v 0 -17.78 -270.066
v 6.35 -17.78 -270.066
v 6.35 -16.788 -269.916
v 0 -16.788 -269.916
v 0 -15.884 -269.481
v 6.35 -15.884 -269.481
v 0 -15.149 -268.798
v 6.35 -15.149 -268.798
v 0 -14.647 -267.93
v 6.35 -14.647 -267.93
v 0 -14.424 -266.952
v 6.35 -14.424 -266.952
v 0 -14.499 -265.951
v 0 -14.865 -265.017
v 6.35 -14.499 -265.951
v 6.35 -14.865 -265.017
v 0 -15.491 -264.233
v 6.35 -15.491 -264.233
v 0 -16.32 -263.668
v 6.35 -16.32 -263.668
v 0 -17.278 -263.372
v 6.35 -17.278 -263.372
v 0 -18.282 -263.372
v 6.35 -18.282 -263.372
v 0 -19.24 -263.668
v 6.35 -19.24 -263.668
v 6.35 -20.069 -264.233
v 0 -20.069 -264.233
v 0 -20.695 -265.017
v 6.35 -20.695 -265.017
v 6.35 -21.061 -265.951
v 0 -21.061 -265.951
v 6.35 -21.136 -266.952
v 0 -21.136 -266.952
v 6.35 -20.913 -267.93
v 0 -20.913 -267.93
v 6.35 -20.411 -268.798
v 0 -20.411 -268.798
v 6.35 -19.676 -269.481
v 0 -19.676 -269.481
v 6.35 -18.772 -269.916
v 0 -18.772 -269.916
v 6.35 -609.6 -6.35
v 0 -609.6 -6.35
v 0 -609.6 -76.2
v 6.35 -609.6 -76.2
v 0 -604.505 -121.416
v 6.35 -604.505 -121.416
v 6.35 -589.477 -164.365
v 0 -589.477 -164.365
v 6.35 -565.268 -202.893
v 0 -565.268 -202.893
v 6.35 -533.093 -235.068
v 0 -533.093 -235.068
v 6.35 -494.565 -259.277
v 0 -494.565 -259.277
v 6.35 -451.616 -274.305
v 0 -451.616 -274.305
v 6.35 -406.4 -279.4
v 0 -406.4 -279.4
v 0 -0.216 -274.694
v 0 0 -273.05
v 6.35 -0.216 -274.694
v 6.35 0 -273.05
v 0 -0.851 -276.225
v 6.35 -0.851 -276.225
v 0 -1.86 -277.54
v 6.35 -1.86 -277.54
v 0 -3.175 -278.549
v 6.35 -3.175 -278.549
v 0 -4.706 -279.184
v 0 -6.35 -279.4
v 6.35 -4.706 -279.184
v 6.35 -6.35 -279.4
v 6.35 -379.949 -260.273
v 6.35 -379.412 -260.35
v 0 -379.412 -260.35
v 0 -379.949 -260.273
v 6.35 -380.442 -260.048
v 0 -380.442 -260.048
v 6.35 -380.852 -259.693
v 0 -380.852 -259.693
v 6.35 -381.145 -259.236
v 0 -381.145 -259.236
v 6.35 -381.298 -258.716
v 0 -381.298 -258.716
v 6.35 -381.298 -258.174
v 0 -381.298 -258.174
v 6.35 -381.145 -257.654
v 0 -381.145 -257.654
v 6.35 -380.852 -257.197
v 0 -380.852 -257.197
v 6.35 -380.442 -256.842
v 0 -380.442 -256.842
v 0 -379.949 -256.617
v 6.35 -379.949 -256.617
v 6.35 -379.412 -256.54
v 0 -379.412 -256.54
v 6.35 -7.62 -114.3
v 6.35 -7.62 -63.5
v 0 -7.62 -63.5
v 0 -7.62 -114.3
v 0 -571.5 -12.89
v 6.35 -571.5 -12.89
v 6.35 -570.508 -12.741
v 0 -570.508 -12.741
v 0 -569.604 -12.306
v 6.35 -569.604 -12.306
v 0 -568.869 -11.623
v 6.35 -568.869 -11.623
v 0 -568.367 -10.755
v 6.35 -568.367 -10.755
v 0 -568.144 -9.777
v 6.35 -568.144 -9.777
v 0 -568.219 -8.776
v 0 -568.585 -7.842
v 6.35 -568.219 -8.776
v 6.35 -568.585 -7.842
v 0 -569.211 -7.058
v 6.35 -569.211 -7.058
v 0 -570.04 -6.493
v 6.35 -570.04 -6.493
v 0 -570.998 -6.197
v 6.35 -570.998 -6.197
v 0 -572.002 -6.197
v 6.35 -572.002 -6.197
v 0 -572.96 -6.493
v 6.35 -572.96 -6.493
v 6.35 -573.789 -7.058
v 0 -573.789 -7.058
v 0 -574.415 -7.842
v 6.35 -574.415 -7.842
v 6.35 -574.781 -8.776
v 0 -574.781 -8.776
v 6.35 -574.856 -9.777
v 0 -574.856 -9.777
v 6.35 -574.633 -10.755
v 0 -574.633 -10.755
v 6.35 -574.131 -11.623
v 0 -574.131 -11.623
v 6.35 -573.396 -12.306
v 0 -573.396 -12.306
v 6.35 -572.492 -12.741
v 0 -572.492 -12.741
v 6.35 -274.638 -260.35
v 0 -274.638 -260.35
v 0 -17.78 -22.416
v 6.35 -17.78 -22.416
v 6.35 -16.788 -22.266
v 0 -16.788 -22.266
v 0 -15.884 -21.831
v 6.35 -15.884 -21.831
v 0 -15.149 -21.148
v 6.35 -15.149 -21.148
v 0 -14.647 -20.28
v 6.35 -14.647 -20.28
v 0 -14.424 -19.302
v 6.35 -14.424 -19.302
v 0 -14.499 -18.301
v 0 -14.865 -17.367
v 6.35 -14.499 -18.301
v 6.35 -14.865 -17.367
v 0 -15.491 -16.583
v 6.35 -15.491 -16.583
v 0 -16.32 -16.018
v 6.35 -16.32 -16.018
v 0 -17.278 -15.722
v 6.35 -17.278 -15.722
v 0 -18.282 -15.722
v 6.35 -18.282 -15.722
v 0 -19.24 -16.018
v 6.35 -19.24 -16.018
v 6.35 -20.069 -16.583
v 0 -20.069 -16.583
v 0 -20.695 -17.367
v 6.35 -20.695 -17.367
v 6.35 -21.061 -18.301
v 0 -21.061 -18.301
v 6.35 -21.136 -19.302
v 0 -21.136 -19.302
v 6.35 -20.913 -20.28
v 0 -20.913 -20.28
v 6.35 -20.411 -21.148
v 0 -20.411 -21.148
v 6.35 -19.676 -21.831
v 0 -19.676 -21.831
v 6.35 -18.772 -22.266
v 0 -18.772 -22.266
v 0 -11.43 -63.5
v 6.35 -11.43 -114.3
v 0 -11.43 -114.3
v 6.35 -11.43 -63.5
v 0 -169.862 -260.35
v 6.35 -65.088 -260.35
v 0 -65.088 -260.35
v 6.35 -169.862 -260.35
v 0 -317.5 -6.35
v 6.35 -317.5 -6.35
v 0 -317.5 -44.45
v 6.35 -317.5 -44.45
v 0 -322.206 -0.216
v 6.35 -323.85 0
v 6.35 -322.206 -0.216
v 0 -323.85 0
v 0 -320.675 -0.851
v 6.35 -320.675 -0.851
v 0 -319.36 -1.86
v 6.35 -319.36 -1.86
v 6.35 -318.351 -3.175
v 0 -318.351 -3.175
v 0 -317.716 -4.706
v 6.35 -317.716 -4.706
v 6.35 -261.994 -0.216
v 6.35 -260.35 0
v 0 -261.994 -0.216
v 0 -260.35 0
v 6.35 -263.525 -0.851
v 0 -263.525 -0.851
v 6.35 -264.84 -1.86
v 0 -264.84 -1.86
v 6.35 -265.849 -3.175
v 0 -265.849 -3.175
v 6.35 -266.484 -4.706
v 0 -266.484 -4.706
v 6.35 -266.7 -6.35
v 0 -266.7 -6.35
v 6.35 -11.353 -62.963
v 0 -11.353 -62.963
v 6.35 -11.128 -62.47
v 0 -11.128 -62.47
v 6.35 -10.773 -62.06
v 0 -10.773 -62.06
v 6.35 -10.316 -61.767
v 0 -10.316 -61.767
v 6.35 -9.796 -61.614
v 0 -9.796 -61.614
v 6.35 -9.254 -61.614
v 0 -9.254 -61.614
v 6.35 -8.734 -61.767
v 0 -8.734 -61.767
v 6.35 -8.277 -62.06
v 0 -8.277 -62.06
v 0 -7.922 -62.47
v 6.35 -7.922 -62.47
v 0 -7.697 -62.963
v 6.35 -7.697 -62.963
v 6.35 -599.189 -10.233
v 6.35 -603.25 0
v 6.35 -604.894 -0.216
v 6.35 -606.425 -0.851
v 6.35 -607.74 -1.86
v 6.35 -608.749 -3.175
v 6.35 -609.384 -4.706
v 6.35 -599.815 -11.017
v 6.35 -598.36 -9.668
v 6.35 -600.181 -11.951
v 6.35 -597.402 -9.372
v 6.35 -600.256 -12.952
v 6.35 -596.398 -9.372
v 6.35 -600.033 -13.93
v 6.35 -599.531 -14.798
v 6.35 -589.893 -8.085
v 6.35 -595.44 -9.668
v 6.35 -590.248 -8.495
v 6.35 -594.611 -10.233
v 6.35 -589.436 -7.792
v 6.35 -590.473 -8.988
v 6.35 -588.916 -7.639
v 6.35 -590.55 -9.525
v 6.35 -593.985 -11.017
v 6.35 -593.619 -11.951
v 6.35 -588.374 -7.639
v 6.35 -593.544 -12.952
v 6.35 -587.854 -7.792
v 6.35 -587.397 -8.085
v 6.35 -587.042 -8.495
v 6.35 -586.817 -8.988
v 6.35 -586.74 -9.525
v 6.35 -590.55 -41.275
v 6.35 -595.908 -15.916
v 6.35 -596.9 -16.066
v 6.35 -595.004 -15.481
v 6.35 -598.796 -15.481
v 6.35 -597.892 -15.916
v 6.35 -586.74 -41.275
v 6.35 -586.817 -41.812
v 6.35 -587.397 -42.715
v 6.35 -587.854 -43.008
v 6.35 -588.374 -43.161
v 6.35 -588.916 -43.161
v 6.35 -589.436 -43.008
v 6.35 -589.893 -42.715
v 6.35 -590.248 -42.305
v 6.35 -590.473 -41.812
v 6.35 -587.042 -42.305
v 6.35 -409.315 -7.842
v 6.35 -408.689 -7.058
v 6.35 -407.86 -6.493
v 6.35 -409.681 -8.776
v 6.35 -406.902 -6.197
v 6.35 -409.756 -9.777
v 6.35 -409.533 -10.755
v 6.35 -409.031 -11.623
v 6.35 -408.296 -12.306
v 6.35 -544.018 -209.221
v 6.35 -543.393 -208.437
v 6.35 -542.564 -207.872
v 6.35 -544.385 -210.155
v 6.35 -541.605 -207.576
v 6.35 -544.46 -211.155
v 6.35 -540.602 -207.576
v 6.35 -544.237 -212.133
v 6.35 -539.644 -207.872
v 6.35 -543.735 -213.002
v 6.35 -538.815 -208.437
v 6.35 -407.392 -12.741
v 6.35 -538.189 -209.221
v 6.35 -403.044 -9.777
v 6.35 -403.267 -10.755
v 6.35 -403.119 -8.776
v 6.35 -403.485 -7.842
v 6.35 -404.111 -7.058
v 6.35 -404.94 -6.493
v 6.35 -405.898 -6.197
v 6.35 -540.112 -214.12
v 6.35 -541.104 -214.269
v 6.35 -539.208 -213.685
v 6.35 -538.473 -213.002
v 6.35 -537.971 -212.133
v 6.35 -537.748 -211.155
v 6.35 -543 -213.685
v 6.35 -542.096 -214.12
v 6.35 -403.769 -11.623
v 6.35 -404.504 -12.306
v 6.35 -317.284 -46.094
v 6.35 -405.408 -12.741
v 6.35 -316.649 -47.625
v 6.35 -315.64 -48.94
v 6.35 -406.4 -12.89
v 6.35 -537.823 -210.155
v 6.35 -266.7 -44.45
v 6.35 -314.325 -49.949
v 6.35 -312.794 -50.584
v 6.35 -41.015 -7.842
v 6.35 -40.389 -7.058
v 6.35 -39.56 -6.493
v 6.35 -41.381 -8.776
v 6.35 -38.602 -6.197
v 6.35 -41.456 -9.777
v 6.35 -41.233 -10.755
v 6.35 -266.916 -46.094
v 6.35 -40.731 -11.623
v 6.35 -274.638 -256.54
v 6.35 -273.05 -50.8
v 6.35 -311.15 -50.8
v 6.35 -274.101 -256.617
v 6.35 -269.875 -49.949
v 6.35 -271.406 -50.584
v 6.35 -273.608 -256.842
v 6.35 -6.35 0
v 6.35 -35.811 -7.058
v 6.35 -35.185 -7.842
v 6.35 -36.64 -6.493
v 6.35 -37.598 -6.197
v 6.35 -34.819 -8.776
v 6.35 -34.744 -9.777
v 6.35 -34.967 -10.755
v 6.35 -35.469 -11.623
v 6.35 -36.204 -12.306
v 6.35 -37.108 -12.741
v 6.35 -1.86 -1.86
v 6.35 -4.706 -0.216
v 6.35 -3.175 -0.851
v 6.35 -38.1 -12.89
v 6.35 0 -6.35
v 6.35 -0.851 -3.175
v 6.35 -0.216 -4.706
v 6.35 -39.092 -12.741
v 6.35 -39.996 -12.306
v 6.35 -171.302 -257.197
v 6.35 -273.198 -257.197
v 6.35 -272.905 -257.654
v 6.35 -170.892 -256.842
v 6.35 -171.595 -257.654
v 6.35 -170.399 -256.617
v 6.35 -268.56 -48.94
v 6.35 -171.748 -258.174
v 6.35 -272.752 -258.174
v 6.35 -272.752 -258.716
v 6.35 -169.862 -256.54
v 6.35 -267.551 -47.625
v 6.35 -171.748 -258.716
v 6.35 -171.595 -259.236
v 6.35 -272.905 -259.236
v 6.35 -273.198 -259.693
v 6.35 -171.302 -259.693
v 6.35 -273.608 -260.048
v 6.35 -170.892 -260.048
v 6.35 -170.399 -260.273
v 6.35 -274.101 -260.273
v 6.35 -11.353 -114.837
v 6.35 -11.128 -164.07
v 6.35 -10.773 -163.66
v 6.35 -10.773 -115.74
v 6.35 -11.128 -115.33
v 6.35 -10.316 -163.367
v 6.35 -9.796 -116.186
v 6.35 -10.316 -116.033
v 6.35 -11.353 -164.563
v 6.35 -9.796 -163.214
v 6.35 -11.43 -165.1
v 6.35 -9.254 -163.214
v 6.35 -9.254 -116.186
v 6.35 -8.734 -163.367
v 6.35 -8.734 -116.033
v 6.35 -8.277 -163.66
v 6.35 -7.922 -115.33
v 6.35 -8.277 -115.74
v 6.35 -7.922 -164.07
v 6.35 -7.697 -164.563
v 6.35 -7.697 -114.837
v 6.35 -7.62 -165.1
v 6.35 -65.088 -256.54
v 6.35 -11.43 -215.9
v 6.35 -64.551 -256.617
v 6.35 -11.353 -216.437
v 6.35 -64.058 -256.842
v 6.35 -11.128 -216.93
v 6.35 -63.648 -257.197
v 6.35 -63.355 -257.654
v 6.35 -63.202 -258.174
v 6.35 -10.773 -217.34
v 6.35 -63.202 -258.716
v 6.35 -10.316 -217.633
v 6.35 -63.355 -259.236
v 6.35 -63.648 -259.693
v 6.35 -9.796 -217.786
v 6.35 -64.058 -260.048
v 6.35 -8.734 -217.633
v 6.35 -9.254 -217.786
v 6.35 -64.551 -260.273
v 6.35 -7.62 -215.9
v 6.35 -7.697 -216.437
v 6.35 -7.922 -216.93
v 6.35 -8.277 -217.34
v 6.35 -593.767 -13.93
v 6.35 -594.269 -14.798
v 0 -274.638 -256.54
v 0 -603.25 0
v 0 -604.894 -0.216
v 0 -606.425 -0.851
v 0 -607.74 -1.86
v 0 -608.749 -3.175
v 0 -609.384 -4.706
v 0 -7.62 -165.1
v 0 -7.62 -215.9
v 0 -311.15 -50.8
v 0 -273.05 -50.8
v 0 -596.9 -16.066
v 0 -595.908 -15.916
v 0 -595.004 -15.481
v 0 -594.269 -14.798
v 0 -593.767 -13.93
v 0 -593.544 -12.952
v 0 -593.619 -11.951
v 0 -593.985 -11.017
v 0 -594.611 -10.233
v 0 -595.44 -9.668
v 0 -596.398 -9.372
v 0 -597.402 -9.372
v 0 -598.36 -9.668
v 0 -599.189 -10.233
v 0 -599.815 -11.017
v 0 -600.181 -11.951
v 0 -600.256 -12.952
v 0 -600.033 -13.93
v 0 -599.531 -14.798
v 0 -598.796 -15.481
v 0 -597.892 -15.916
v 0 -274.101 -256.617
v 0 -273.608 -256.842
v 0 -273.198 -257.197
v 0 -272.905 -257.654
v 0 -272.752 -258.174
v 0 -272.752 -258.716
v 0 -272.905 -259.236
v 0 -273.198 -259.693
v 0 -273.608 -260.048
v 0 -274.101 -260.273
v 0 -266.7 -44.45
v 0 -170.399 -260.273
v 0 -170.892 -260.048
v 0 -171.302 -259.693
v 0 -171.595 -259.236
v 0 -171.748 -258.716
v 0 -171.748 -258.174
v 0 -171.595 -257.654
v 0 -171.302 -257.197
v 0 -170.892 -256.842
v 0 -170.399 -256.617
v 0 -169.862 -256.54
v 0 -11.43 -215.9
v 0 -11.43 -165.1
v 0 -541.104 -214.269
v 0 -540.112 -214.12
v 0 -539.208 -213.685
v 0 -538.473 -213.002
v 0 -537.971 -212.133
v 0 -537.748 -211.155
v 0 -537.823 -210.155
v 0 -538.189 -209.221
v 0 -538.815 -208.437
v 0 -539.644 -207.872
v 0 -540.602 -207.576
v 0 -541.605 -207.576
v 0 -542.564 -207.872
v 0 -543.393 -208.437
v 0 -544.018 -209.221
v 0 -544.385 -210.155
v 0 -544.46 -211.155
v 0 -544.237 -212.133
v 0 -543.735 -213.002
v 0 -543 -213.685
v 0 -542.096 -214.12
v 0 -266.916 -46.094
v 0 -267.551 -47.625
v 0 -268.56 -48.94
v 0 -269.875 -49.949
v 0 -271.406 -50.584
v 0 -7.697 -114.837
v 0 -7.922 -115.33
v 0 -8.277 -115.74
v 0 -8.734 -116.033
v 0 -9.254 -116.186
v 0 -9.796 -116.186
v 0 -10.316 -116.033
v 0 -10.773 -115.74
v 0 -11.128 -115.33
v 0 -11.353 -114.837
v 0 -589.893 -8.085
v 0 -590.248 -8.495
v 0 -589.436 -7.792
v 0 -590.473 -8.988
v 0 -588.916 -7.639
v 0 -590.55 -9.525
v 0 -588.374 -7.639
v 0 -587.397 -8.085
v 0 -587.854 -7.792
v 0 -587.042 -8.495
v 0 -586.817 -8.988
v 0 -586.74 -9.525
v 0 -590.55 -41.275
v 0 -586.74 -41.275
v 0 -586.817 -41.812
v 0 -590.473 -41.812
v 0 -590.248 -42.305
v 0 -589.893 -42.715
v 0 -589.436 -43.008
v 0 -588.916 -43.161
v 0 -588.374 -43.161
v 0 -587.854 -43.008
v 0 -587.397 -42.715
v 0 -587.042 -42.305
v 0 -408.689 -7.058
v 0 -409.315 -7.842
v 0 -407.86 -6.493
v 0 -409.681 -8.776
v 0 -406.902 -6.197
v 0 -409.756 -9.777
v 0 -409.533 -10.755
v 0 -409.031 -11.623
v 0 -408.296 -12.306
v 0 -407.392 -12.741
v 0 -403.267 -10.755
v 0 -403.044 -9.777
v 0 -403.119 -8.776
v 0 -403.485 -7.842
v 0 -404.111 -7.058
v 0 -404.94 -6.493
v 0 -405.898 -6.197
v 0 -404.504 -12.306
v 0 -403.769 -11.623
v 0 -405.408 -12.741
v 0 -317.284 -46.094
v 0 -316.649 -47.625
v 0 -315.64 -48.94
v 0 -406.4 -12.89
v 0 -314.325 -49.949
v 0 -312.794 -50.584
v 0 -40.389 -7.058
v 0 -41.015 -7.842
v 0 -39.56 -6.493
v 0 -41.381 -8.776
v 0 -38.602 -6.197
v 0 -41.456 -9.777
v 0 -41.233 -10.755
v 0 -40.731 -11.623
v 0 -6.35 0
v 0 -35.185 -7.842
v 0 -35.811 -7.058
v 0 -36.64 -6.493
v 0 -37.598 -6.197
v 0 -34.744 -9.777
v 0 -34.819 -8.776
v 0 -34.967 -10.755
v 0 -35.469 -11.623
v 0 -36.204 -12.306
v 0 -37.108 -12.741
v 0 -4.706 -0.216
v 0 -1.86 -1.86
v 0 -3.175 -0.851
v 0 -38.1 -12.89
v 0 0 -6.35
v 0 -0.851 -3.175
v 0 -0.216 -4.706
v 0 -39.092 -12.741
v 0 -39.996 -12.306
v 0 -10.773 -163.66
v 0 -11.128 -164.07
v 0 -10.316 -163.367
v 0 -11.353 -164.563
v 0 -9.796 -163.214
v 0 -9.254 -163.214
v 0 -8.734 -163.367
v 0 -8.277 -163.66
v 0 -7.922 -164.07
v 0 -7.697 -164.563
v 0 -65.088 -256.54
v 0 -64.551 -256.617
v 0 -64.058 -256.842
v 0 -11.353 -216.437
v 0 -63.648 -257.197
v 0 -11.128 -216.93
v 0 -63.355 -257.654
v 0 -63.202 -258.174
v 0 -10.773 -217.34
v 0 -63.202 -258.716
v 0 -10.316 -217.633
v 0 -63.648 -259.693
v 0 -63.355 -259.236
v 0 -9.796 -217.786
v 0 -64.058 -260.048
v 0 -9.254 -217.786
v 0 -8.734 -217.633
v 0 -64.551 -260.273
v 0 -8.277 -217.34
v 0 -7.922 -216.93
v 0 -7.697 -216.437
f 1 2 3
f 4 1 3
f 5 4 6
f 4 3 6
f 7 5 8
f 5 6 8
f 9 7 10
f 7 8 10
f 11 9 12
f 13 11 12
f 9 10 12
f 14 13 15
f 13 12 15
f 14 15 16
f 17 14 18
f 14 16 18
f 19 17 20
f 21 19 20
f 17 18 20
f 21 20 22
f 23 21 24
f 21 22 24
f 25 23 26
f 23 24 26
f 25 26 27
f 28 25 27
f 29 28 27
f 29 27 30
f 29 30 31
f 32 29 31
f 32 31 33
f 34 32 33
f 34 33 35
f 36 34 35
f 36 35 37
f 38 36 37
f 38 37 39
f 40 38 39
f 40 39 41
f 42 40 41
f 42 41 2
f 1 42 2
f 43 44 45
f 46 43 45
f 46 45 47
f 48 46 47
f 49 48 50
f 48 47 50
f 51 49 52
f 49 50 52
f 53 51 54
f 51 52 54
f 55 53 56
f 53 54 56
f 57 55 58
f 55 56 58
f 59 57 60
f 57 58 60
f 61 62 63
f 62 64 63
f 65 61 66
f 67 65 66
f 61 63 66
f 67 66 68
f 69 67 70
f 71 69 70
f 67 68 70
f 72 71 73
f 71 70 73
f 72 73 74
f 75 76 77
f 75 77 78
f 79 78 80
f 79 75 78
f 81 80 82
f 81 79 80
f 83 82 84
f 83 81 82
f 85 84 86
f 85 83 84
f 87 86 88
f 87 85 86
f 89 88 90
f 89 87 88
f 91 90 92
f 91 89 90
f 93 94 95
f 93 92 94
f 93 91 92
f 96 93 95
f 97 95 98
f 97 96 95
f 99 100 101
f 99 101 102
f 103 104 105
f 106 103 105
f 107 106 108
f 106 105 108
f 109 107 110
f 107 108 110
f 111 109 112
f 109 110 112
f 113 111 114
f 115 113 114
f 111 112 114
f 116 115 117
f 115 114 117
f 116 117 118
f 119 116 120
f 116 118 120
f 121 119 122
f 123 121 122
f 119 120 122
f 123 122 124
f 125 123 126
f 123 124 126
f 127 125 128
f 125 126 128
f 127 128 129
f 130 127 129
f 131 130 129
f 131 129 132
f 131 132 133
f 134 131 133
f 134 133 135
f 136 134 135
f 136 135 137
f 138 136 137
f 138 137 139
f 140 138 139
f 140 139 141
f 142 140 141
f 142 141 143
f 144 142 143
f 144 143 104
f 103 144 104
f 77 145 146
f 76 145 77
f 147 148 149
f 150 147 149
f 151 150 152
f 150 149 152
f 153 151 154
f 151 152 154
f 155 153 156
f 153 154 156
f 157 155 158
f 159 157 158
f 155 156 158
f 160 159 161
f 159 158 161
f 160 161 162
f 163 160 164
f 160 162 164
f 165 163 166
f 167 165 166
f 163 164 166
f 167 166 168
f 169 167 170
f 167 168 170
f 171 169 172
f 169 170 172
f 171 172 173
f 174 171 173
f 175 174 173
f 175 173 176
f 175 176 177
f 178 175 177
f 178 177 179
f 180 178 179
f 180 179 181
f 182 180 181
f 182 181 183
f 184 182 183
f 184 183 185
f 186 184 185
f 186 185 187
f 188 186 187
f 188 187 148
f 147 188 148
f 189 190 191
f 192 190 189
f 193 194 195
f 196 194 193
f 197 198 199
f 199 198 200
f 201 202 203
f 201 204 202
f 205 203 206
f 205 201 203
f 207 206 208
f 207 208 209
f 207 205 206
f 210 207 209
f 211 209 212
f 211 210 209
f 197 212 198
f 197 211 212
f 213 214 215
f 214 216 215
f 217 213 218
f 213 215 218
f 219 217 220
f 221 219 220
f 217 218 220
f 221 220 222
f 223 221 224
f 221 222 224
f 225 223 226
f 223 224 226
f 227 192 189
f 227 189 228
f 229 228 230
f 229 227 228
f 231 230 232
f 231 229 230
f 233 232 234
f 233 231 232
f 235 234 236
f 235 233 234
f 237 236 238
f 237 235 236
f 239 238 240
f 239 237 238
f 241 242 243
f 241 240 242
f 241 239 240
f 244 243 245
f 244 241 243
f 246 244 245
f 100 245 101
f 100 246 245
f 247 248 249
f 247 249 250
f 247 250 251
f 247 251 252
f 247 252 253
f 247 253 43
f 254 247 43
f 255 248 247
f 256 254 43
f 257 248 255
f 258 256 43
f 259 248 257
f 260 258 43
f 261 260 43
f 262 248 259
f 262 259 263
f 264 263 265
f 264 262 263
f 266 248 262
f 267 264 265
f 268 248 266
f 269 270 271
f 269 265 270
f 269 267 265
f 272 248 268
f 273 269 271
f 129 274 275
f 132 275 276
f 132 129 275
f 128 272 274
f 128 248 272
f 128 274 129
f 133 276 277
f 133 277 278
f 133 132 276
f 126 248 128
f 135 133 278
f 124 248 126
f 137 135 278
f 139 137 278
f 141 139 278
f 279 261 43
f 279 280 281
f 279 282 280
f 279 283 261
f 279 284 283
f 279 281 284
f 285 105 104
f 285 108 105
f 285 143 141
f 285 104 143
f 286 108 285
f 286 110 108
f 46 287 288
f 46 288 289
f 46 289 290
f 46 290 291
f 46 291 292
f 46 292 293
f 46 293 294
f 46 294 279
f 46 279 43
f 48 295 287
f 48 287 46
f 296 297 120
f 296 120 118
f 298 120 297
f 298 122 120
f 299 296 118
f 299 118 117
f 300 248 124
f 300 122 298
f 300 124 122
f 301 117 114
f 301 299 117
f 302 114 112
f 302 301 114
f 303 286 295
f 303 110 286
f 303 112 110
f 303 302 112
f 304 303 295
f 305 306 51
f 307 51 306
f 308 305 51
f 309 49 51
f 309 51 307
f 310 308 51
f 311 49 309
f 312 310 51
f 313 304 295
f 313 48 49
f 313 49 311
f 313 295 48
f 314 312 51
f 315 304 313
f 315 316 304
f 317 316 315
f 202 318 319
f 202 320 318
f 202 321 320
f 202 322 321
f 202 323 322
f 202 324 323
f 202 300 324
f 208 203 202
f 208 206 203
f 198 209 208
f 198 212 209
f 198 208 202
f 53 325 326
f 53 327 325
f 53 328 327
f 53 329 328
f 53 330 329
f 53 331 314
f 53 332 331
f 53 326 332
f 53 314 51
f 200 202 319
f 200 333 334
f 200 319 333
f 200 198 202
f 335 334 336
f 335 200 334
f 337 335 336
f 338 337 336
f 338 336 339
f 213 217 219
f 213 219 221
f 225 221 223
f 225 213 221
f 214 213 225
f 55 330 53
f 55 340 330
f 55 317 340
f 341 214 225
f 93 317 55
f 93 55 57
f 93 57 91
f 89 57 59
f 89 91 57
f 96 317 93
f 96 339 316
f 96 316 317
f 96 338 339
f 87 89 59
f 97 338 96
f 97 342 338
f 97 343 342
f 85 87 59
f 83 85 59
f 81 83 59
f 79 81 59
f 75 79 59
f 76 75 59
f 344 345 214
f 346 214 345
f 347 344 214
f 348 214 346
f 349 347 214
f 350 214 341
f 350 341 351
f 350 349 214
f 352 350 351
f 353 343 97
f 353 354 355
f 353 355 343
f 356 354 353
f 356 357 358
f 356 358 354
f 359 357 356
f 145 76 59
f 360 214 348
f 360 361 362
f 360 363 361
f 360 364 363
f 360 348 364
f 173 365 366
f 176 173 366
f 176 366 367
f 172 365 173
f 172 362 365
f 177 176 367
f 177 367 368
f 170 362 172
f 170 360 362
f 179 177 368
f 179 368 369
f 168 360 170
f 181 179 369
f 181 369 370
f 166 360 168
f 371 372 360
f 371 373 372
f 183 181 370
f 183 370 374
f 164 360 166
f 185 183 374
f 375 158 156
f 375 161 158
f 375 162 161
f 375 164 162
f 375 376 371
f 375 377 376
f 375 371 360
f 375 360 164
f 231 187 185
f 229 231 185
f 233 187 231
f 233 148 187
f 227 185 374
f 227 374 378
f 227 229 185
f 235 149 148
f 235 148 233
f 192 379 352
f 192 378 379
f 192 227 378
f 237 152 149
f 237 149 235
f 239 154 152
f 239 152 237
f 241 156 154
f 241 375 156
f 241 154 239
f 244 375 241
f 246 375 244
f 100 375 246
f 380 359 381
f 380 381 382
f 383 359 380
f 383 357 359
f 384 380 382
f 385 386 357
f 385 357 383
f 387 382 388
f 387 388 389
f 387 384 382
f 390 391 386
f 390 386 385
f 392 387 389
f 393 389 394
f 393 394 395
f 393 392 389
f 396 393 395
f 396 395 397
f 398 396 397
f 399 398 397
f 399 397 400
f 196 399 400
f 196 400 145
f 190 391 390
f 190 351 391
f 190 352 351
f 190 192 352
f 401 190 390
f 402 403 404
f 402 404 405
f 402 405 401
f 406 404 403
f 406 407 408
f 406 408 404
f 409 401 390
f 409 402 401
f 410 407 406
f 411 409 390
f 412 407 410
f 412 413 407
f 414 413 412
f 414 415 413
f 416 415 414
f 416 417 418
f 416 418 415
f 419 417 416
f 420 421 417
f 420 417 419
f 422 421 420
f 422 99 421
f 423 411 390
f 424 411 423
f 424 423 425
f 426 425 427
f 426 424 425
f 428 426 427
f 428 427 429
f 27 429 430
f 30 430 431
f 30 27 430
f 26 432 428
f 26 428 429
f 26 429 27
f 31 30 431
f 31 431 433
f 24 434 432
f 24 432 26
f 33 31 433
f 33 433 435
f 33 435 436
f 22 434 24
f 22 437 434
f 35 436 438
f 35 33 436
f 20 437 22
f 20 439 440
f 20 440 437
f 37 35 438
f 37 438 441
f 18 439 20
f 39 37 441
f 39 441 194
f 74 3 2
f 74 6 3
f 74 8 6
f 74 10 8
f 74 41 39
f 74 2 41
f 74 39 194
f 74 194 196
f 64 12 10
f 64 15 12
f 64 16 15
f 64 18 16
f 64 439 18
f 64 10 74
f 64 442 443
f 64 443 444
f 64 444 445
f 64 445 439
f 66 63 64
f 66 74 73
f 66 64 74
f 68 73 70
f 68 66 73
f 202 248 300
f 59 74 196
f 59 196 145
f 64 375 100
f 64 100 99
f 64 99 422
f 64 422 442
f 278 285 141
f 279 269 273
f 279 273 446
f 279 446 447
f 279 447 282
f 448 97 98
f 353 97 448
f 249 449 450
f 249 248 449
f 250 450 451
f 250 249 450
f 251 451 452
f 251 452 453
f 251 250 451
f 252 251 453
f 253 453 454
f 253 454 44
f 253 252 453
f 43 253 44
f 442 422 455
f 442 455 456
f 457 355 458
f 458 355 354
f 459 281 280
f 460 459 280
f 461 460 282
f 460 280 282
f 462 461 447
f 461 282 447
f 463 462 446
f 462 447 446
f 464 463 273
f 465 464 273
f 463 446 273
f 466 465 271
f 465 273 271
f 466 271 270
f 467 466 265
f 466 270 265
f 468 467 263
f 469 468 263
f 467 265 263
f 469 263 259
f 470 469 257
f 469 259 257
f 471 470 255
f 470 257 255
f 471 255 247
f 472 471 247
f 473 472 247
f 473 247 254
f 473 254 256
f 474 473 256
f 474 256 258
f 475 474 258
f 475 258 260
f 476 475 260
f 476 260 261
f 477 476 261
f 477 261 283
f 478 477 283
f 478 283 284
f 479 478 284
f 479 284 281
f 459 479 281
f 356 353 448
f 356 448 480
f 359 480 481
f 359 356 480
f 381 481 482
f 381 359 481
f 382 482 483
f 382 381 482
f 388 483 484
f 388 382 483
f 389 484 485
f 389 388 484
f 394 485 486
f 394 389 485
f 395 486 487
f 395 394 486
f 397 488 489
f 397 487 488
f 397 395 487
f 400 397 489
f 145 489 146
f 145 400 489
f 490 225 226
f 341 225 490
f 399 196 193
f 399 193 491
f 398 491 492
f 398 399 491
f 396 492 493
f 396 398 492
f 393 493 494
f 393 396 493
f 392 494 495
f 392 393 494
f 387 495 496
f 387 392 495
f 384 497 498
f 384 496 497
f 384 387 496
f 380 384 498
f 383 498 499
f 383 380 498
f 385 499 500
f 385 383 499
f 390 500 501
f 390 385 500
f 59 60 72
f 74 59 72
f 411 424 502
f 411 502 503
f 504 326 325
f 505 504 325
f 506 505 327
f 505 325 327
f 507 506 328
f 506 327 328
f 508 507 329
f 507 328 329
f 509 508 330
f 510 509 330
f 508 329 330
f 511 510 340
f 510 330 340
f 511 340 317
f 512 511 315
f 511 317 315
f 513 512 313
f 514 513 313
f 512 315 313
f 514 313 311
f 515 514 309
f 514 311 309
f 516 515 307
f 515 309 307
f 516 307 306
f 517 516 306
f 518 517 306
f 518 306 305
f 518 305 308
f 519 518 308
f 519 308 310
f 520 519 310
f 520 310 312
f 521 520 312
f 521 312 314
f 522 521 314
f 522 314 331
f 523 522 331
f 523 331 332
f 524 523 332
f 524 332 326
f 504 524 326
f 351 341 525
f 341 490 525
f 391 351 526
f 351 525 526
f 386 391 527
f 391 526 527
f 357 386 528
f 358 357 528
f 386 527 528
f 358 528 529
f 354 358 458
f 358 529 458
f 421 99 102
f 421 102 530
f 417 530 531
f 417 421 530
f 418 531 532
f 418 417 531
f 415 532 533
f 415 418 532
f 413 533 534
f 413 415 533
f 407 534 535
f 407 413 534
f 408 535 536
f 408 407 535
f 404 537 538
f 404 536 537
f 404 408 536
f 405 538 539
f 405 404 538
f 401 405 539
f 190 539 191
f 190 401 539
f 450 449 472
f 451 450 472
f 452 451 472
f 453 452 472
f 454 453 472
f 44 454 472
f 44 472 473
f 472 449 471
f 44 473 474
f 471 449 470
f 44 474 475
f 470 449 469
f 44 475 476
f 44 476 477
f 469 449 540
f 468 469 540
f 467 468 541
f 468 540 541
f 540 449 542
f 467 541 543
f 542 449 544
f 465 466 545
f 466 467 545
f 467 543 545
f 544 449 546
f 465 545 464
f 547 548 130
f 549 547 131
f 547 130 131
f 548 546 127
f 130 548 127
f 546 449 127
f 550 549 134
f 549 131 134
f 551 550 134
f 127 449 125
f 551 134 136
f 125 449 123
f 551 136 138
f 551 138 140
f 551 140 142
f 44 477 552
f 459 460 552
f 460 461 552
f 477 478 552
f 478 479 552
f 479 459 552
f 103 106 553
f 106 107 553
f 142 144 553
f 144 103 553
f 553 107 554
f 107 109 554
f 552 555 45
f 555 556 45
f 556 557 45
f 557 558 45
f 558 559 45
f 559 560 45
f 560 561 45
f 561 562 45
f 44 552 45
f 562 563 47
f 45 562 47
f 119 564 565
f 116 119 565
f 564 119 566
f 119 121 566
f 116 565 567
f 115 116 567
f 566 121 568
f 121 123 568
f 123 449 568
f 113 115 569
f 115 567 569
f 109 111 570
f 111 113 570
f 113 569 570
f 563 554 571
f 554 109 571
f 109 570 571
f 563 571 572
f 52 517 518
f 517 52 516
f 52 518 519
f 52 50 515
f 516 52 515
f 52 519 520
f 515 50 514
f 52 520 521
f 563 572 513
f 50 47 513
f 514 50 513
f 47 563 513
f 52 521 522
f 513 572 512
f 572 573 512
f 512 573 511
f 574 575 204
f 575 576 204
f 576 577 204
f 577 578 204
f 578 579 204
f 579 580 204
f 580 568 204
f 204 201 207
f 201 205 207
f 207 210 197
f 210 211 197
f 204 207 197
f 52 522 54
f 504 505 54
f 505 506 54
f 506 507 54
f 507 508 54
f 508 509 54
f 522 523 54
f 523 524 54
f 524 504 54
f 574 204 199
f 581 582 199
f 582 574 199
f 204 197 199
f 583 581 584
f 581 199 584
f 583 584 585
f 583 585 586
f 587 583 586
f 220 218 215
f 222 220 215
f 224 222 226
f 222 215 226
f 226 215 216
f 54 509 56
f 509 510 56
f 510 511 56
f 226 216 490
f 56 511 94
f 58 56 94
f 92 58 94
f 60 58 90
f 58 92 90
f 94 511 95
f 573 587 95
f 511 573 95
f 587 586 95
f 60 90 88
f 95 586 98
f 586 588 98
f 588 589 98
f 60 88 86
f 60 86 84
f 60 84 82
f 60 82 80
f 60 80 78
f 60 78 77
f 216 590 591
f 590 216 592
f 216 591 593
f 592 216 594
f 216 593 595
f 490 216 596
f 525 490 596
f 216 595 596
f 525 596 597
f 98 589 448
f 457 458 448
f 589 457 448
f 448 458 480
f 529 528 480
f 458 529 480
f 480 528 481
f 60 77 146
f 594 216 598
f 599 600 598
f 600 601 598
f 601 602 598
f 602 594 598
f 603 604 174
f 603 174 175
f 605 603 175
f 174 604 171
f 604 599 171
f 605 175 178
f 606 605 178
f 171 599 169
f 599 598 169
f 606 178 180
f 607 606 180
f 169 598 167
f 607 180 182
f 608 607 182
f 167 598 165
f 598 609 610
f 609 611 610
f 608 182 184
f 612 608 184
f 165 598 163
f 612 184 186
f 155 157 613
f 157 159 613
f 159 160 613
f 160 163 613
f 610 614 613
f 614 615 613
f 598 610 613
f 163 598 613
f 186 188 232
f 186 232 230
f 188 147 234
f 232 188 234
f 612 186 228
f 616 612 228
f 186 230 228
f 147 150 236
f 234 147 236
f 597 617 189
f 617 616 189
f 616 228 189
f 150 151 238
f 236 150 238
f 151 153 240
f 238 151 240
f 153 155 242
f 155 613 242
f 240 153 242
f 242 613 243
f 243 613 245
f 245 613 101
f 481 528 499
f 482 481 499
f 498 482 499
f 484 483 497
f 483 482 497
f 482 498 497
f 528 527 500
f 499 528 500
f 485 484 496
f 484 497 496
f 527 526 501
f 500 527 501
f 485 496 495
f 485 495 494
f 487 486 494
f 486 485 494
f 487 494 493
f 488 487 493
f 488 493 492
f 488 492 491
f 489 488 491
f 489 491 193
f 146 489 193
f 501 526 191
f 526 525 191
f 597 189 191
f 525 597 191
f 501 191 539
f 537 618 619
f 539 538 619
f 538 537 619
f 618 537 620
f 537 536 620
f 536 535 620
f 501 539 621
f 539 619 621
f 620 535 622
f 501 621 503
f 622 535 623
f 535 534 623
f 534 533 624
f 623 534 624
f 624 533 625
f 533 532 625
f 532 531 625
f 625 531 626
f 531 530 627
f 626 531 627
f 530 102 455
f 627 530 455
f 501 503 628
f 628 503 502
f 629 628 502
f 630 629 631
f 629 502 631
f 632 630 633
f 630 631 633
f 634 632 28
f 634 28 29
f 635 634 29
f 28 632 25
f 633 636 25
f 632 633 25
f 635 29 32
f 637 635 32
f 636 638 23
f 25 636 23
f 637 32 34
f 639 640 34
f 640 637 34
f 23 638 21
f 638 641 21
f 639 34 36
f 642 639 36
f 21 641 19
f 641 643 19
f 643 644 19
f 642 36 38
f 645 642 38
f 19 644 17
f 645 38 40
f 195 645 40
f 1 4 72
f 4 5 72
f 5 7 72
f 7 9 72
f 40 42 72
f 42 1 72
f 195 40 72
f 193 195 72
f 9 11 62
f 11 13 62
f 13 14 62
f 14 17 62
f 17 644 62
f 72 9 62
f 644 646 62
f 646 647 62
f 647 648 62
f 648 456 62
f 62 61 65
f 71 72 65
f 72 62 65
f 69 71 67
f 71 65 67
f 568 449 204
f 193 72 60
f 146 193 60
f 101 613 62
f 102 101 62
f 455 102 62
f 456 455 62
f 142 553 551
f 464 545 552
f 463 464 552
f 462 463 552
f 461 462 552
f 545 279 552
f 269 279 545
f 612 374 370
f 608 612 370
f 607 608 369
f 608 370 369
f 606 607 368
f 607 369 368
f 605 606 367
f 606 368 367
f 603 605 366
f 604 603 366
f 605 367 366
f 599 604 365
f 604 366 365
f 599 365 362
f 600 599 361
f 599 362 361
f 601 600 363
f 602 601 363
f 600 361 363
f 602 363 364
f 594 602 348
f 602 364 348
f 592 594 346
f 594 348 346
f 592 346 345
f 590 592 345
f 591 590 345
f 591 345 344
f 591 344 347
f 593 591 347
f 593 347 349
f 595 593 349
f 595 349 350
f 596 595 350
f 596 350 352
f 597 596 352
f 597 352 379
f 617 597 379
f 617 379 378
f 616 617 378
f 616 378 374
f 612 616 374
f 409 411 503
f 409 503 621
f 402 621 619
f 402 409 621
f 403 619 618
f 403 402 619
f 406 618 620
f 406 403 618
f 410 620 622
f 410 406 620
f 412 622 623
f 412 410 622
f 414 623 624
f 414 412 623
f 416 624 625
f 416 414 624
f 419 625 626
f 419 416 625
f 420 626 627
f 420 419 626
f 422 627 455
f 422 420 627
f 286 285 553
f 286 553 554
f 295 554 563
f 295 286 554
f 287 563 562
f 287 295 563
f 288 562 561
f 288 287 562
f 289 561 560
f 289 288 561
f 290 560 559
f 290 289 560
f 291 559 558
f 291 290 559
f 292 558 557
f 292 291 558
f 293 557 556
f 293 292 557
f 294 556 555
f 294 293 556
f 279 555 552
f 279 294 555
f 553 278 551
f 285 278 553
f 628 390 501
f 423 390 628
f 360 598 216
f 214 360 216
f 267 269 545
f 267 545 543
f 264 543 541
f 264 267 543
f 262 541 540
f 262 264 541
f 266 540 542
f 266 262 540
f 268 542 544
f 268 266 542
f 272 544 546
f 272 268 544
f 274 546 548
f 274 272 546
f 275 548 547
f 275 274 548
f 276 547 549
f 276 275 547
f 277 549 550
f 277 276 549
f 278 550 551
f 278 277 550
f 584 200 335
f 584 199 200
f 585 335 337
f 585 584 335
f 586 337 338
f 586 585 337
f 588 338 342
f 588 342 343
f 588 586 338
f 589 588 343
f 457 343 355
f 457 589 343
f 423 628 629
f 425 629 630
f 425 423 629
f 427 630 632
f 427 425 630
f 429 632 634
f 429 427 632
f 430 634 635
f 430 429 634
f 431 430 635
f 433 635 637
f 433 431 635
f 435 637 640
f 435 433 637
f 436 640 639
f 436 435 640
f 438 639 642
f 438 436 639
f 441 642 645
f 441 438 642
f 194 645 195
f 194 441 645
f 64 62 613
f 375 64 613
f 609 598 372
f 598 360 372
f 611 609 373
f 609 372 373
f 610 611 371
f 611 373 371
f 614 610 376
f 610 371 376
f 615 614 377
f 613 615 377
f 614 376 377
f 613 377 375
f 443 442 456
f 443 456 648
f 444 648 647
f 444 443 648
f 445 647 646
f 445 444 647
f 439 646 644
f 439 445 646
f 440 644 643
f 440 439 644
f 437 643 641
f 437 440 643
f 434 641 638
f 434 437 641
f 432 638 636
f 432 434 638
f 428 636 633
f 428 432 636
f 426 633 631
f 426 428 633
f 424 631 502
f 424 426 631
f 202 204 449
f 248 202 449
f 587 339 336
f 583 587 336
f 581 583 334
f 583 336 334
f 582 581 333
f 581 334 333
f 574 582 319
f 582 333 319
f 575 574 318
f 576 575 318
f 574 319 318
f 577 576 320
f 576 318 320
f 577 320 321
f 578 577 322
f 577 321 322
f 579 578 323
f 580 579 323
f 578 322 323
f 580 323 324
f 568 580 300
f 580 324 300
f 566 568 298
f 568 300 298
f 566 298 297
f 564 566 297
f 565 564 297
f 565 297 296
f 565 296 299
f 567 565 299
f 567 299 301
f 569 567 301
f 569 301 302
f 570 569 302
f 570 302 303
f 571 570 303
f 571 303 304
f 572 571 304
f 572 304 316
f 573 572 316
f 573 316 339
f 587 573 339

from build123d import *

# Parameters (mm, degrees)
BOSS_EXTRUDE1_DEPTH     = 6.35
SKETCH2_R               = 3.3655
CUT_EXTRUDE1_DEPTH      = 7.35
FILLET1_R               = 6.35
CUT_EXTRUDE6_DEPTH      = 7.35
SKETCH4_R               = 3.3655
CUT_EXTRUDE3_DEPTH      = 7.35
CUT_EXTRUDE7_DEPTH      = 7.35
CUT_EXTRUDE8_DEPTH      = 1
CUT_EXTRUDE8_DEPTH_BACK = 7.35
SKETCH8_W               = 50.8
SKETCH8_H               = 50.8
CUT_EXTRUDE9_DEPTH      = 7.35
FILLET2_R               = 6.35


with BuildPart() as part:
    # Sketch1 → Boss-Extrude1 (new body)
    with BuildSketch(Plane(origin=(0, 0, 0), x_dir=(0, 0, -1), z_dir=(1, 0, 0))):
        with BuildLine():
            Line((0, 0), (0, -609.6))
            Line((0, -609.6), (76.2, -609.6))
            ThreePointArc((76.2, -609.6), (219.884097937, -550.084097937), (279.4, -406.4))
            Line((279.4, -406.4), (279.4, 0))
            Line((279.4, 0), (0, 0))
        make_face()
    extrude(amount=BOSS_EXTRUDE1_DEPTH)

    # Sketch2 → Cut-Extrude1 (cut, through all)
    with BuildSketch(Plane(origin=(6.35, 0, 0), x_dir=(0, 0, -1), z_dir=(1, 0, 0))):
        with Locations((266.7, -17.78)):
            Circle(SKETCH2_R)
        with Locations((12.7, -596.9)):
            Circle(SKETCH2_R)
        with Locations((210.903841816, -541.103841816)):
            Circle(SKETCH2_R)
        with Locations((19.05, -17.78)):
            Circle(SKETCH2_R)
    extrude(amount=-CUT_EXTRUDE1_DEPTH, mode=Mode.SUBTRACT)

    # Fillet1
    fillet1_edges = [part.edges().sort_by_distance(p)[0] for p in [
        (3.175, 0, -279.4),
        (3.175, -609.6, 0),
        (3.175, 0, 0),
    ]]
    fillet(fillet1_edges, radius=FILLET1_R)

    # Sketch3 → Cut-Extrude6 (cut, through all)
    with BuildSketch(Plane(origin=(6.35, 0, 0), x_dir=(0, 0, -1), z_dir=(1, 0, 0))):
        with BuildLine():
            Line((63.5, -7.62), (114.3, -7.62))
            ThreePointArc((114.3, -7.62), (116.205, -9.525), (114.3, -11.43))
            Line((114.3, -11.43), (63.5, -11.43))
            ThreePointArc((63.5, -11.43), (61.595, -9.525), (63.5, -7.62))
        make_face()
        with BuildLine():
            Line((165.1, -7.62), (215.9, -7.62))
            ThreePointArc((215.9, -7.62), (217.805, -9.525), (215.9, -11.43))
            Line((215.9, -11.43), (165.1, -11.43))
            ThreePointArc((165.1, -11.43), (163.195, -9.525), (165.1, -7.62))
        make_face()
    extrude(amount=-CUT_EXTRUDE6_DEPTH, mode=Mode.SUBTRACT)

    # Sketch4 → Cut-Extrude3 (cut, through all)
    with BuildSketch(Plane(origin=(6.35, 0, 0), x_dir=(0, 0, -1), z_dir=(1, 0, 0))):
        with Locations((9.525, -38.1)):
            Circle(SKETCH4_R)
        with Locations((9.525, -406.4)):
            Circle(SKETCH4_R)
        with Locations((9.525, -571.5)):
            Circle(SKETCH4_R)
    extrude(amount=-CUT_EXTRUDE3_DEPTH, mode=Mode.SUBTRACT)

    # Sketch6 → Cut-Extrude7 (cut, through all)
    with BuildSketch(Plane(origin=(6.35, 0, 0), x_dir=(0, 0, -1), z_dir=(1, 0, 0))):
        with BuildLine():
            Line((260.35, -65.0875), (260.35, -169.8625))
            ThreePointArc((260.35, -169.8625), (258.445, -171.7675), (256.54, -169.8625))
            Line((256.54, -169.8625), (256.54, -65.0875))
            ThreePointArc((256.54, -65.0875), (258.445, -63.1825), (260.35, -65.0875))
        make_face()
        with BuildLine():
            Line((256.54, -379.4125), (256.54, -274.6375))
            ThreePointArc((256.54, -274.6375), (258.445, -272.7325), (260.35, -274.6375))
            Line((260.35, -274.6375), (260.35, -379.4125))
            ThreePointArc((260.35, -379.4125), (258.445, -381.3175), (256.54, -379.4125))
        make_face()
    extrude(amount=-CUT_EXTRUDE7_DEPTH, mode=Mode.SUBTRACT)

    # Sketch7 → Cut-Extrude8 (cut, two sides)
    with BuildSketch(Plane(origin=(6.35, 0, 0), x_dir=(0, 0, -1), z_dir=(1, 0, 0))) as cut_extrude8_sk:
        with BuildLine():
            Line((9.525, -586.74), (41.275, -586.74))
            ThreePointArc((41.275, -586.74), (43.18, -588.645), (41.275, -590.55))
            Line((41.275, -590.55), (9.525, -590.55))
            ThreePointArc((9.525, -590.55), (7.62, -588.645), (9.525, -586.74))
        make_face()
    extrude(amount=CUT_EXTRUDE8_DEPTH, mode=Mode.SUBTRACT)
    extrude(cut_extrude8_sk.sketch, amount=-CUT_EXTRUDE8_DEPTH_BACK, mode=Mode.SUBTRACT)

    # Sketch8 → Cut-Extrude9 (cut, through all)
    with BuildSketch(Plane(origin=(6.35, 0, 0), x_dir=(0, 0, -1), z_dir=(1, 0, 0))):
        with Locations((25.4, -292.1)):
            Rectangle(SKETCH8_W, SKETCH8_H)
    extrude(amount=-CUT_EXTRUDE9_DEPTH, mode=Mode.SUBTRACT)

    # Fillet2
    fillet2_edges = [part.edges().sort_by_distance(p)[0] for p in [
        (3.175, -317.5, 0),
        (3.175, -266.7, 0),
        (3.175, -266.7, -50.8),
        (3.175, -317.5, -50.8),
    ]]
    fillet(fillet2_edges, radius=FILLET2_R)


solid = part.part
